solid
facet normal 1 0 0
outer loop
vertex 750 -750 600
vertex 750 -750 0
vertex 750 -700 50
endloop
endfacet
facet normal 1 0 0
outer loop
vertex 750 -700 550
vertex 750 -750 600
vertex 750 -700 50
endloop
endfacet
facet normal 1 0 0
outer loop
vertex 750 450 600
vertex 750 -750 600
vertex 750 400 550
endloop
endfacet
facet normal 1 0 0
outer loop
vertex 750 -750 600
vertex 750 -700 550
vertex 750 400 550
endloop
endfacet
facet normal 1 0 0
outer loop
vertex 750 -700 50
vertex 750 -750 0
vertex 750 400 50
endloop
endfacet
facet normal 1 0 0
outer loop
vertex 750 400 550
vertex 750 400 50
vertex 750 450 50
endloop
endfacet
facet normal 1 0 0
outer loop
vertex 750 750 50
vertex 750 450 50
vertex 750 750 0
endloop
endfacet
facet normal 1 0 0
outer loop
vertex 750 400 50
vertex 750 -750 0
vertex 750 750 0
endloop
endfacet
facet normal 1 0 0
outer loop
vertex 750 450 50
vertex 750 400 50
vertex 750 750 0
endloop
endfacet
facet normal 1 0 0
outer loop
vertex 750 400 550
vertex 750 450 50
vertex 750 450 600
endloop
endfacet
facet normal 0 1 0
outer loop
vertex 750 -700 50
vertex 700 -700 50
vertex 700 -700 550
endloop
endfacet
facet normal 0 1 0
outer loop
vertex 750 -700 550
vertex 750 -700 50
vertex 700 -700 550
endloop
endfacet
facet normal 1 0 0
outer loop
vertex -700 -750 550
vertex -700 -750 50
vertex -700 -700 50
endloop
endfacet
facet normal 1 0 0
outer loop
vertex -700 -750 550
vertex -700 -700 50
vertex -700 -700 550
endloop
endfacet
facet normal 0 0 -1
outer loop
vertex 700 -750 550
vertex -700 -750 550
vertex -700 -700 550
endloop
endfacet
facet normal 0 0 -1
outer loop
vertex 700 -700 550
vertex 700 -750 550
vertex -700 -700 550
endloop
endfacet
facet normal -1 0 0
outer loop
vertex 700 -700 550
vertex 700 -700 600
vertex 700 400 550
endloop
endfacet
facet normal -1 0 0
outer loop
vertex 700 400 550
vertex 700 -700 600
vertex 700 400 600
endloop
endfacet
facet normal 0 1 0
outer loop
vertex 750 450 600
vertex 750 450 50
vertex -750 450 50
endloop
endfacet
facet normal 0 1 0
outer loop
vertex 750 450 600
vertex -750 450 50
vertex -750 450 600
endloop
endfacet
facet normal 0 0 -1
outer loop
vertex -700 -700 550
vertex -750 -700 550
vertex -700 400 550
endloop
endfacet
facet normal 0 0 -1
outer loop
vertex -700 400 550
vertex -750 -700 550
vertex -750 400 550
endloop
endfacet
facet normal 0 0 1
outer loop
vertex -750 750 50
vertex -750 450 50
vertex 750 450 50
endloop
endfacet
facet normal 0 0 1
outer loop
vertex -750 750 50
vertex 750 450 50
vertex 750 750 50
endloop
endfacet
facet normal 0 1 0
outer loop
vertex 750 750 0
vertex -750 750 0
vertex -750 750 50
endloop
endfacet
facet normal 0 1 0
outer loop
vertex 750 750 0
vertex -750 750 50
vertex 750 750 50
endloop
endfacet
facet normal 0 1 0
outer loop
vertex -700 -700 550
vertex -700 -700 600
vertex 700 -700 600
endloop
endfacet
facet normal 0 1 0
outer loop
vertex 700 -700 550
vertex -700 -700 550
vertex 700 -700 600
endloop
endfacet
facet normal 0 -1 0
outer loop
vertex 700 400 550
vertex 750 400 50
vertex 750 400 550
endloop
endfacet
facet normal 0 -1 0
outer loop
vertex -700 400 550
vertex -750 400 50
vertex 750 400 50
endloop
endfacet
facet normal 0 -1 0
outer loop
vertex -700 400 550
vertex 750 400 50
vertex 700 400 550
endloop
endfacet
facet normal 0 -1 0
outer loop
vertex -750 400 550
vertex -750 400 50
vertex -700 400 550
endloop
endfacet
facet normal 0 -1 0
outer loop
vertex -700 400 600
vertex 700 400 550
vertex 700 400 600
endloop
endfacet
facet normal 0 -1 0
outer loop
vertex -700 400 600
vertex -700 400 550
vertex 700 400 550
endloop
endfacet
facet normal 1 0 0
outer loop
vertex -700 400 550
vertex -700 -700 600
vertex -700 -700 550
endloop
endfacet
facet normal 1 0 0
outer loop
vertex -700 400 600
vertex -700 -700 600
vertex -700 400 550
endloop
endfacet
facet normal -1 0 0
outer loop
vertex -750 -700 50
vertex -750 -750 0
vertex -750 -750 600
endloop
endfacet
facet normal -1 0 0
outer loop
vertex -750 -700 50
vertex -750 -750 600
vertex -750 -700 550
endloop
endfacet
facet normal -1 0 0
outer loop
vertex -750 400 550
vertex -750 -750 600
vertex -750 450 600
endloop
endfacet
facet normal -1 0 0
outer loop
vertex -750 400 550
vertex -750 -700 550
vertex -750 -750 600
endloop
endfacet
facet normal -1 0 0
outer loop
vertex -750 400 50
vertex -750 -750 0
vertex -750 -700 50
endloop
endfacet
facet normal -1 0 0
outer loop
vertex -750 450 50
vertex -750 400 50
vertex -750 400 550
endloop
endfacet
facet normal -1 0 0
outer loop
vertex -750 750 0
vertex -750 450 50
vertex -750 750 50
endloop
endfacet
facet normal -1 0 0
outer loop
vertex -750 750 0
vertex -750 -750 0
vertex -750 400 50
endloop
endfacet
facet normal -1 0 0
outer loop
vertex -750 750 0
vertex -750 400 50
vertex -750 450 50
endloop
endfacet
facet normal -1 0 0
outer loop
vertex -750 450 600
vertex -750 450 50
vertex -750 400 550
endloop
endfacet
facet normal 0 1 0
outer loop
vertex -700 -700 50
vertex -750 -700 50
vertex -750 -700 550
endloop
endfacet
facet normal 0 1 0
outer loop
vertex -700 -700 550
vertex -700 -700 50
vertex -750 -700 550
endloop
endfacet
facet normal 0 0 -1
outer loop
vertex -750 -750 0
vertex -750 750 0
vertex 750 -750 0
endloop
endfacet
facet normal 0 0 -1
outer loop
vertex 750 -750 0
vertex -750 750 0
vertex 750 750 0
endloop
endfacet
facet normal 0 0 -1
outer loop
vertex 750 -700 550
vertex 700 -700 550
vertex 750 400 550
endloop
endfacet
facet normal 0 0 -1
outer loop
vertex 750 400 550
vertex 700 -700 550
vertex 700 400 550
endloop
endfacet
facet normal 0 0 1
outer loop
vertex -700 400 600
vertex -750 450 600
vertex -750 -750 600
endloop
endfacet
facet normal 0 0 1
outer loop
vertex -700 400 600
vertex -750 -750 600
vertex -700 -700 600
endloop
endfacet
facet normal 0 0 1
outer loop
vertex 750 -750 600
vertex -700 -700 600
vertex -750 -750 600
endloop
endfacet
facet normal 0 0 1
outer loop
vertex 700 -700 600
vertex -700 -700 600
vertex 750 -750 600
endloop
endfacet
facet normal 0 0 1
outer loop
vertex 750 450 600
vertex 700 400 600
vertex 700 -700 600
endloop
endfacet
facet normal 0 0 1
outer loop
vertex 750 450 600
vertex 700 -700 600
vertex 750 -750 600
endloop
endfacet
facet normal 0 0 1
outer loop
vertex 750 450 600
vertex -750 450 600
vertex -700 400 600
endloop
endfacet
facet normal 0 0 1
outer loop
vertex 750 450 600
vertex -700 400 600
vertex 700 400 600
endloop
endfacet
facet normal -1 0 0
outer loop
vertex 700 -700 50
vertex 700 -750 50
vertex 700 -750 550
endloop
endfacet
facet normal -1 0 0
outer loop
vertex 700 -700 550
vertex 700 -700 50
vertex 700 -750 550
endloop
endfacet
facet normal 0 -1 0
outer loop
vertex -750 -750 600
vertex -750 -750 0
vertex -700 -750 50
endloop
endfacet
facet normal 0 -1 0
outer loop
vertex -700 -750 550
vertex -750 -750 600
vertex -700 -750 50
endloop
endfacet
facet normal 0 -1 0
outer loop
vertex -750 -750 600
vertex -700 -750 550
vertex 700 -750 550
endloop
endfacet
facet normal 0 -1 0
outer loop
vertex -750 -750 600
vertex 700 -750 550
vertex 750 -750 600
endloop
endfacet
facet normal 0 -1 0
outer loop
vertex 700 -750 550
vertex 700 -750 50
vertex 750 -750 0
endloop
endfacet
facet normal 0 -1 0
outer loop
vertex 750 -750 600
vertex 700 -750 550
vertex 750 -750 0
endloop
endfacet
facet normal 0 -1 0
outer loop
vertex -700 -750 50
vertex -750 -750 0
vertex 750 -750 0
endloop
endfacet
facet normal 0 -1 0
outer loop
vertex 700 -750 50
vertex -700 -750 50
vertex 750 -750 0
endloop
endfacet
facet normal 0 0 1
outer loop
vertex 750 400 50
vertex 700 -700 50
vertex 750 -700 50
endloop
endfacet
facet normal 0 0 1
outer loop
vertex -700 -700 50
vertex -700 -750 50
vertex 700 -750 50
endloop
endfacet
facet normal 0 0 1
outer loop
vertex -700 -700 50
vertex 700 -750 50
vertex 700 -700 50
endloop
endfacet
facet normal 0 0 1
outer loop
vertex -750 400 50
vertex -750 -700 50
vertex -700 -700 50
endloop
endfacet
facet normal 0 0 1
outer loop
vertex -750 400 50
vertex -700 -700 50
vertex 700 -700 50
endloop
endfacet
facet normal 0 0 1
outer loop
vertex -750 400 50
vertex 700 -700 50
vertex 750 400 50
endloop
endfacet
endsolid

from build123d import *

# Parameters (mm, degrees)
SKETCH1_W           = 1500
SKETCH1_H           = 1500
BOSS_EXTRUDE1_DEPTH = 600
CUT_EXTRUDE1_REACH  = 1783.151
SKETCH4_W           = 550
SKETCH4_H           = 300
SKETCH5_W           = 1400
SKETCH5_H           = 500
CUT_EXTRUDE2_DEPTH  = 1150
SKETCH6_W           = 500
SKETCH6_H           = 1100
CUT_EXTRUDE3_DEPTH  = 2364
SKETCH7_W           = 1400
SKETCH7_H           = 1100
CUT_EXTRUDE4_DEPTH  = 320


with BuildPart() as part:
    # Sketch1 → Boss-Extrude1 (new body)
    with BuildSketch(Plane.XY):
        Rectangle(SKETCH1_W, SKETCH1_H)
    extrude(amount=BOSS_EXTRUDE1_DEPTH)

    # Sketch4 → Cut-Extrude1 (cut, up to next)
    with BuildSketch(Plane.ZY.offset(750), mode=Mode.PRIVATE) as cut_extrude1_sk1:
        with Locations((325, 600)):
            Rectangle(SKETCH4_W, SKETCH4_H)
    cut_extrude1_tool1 = extrude(cut_extrude1_sk1.sketch, amount=-CUT_EXTRUDE1_REACH, mode=Mode.PRIVATE) & part.part
    add(cut_extrude1_tool1.solids().sort_by_distance((-750, 600, 325))[0], mode=Mode.SUBTRACT)

    # Sketch5 → Cut-Extrude2 (cut)
    with BuildSketch(Plane.XZ.offset(750)):
        with Locations((0, 300)):
            Rectangle(SKETCH5_W, SKETCH5_H)
    extrude(amount=-CUT_EXTRUDE2_DEPTH, mode=Mode.SUBTRACT)

    # Sketch6 → Cut-Extrude3 (cut)
    with BuildSketch(Plane.ZY.offset(750)):
        with Locations((300, -150)):
            Rectangle(SKETCH6_W, SKETCH6_H)
    extrude(amount=-CUT_EXTRUDE3_DEPTH, mode=Mode.SUBTRACT)

    # Sketch7 → Cut-Extrude4 (cut)
    with BuildSketch(Plane.XY.offset(600)):
        with Locations((0, -150)):
            Rectangle(SKETCH7_W, SKETCH7_H)
    extrude(amount=-CUT_EXTRUDE4_DEPTH, mode=Mode.SUBTRACT)


solid = part.part
